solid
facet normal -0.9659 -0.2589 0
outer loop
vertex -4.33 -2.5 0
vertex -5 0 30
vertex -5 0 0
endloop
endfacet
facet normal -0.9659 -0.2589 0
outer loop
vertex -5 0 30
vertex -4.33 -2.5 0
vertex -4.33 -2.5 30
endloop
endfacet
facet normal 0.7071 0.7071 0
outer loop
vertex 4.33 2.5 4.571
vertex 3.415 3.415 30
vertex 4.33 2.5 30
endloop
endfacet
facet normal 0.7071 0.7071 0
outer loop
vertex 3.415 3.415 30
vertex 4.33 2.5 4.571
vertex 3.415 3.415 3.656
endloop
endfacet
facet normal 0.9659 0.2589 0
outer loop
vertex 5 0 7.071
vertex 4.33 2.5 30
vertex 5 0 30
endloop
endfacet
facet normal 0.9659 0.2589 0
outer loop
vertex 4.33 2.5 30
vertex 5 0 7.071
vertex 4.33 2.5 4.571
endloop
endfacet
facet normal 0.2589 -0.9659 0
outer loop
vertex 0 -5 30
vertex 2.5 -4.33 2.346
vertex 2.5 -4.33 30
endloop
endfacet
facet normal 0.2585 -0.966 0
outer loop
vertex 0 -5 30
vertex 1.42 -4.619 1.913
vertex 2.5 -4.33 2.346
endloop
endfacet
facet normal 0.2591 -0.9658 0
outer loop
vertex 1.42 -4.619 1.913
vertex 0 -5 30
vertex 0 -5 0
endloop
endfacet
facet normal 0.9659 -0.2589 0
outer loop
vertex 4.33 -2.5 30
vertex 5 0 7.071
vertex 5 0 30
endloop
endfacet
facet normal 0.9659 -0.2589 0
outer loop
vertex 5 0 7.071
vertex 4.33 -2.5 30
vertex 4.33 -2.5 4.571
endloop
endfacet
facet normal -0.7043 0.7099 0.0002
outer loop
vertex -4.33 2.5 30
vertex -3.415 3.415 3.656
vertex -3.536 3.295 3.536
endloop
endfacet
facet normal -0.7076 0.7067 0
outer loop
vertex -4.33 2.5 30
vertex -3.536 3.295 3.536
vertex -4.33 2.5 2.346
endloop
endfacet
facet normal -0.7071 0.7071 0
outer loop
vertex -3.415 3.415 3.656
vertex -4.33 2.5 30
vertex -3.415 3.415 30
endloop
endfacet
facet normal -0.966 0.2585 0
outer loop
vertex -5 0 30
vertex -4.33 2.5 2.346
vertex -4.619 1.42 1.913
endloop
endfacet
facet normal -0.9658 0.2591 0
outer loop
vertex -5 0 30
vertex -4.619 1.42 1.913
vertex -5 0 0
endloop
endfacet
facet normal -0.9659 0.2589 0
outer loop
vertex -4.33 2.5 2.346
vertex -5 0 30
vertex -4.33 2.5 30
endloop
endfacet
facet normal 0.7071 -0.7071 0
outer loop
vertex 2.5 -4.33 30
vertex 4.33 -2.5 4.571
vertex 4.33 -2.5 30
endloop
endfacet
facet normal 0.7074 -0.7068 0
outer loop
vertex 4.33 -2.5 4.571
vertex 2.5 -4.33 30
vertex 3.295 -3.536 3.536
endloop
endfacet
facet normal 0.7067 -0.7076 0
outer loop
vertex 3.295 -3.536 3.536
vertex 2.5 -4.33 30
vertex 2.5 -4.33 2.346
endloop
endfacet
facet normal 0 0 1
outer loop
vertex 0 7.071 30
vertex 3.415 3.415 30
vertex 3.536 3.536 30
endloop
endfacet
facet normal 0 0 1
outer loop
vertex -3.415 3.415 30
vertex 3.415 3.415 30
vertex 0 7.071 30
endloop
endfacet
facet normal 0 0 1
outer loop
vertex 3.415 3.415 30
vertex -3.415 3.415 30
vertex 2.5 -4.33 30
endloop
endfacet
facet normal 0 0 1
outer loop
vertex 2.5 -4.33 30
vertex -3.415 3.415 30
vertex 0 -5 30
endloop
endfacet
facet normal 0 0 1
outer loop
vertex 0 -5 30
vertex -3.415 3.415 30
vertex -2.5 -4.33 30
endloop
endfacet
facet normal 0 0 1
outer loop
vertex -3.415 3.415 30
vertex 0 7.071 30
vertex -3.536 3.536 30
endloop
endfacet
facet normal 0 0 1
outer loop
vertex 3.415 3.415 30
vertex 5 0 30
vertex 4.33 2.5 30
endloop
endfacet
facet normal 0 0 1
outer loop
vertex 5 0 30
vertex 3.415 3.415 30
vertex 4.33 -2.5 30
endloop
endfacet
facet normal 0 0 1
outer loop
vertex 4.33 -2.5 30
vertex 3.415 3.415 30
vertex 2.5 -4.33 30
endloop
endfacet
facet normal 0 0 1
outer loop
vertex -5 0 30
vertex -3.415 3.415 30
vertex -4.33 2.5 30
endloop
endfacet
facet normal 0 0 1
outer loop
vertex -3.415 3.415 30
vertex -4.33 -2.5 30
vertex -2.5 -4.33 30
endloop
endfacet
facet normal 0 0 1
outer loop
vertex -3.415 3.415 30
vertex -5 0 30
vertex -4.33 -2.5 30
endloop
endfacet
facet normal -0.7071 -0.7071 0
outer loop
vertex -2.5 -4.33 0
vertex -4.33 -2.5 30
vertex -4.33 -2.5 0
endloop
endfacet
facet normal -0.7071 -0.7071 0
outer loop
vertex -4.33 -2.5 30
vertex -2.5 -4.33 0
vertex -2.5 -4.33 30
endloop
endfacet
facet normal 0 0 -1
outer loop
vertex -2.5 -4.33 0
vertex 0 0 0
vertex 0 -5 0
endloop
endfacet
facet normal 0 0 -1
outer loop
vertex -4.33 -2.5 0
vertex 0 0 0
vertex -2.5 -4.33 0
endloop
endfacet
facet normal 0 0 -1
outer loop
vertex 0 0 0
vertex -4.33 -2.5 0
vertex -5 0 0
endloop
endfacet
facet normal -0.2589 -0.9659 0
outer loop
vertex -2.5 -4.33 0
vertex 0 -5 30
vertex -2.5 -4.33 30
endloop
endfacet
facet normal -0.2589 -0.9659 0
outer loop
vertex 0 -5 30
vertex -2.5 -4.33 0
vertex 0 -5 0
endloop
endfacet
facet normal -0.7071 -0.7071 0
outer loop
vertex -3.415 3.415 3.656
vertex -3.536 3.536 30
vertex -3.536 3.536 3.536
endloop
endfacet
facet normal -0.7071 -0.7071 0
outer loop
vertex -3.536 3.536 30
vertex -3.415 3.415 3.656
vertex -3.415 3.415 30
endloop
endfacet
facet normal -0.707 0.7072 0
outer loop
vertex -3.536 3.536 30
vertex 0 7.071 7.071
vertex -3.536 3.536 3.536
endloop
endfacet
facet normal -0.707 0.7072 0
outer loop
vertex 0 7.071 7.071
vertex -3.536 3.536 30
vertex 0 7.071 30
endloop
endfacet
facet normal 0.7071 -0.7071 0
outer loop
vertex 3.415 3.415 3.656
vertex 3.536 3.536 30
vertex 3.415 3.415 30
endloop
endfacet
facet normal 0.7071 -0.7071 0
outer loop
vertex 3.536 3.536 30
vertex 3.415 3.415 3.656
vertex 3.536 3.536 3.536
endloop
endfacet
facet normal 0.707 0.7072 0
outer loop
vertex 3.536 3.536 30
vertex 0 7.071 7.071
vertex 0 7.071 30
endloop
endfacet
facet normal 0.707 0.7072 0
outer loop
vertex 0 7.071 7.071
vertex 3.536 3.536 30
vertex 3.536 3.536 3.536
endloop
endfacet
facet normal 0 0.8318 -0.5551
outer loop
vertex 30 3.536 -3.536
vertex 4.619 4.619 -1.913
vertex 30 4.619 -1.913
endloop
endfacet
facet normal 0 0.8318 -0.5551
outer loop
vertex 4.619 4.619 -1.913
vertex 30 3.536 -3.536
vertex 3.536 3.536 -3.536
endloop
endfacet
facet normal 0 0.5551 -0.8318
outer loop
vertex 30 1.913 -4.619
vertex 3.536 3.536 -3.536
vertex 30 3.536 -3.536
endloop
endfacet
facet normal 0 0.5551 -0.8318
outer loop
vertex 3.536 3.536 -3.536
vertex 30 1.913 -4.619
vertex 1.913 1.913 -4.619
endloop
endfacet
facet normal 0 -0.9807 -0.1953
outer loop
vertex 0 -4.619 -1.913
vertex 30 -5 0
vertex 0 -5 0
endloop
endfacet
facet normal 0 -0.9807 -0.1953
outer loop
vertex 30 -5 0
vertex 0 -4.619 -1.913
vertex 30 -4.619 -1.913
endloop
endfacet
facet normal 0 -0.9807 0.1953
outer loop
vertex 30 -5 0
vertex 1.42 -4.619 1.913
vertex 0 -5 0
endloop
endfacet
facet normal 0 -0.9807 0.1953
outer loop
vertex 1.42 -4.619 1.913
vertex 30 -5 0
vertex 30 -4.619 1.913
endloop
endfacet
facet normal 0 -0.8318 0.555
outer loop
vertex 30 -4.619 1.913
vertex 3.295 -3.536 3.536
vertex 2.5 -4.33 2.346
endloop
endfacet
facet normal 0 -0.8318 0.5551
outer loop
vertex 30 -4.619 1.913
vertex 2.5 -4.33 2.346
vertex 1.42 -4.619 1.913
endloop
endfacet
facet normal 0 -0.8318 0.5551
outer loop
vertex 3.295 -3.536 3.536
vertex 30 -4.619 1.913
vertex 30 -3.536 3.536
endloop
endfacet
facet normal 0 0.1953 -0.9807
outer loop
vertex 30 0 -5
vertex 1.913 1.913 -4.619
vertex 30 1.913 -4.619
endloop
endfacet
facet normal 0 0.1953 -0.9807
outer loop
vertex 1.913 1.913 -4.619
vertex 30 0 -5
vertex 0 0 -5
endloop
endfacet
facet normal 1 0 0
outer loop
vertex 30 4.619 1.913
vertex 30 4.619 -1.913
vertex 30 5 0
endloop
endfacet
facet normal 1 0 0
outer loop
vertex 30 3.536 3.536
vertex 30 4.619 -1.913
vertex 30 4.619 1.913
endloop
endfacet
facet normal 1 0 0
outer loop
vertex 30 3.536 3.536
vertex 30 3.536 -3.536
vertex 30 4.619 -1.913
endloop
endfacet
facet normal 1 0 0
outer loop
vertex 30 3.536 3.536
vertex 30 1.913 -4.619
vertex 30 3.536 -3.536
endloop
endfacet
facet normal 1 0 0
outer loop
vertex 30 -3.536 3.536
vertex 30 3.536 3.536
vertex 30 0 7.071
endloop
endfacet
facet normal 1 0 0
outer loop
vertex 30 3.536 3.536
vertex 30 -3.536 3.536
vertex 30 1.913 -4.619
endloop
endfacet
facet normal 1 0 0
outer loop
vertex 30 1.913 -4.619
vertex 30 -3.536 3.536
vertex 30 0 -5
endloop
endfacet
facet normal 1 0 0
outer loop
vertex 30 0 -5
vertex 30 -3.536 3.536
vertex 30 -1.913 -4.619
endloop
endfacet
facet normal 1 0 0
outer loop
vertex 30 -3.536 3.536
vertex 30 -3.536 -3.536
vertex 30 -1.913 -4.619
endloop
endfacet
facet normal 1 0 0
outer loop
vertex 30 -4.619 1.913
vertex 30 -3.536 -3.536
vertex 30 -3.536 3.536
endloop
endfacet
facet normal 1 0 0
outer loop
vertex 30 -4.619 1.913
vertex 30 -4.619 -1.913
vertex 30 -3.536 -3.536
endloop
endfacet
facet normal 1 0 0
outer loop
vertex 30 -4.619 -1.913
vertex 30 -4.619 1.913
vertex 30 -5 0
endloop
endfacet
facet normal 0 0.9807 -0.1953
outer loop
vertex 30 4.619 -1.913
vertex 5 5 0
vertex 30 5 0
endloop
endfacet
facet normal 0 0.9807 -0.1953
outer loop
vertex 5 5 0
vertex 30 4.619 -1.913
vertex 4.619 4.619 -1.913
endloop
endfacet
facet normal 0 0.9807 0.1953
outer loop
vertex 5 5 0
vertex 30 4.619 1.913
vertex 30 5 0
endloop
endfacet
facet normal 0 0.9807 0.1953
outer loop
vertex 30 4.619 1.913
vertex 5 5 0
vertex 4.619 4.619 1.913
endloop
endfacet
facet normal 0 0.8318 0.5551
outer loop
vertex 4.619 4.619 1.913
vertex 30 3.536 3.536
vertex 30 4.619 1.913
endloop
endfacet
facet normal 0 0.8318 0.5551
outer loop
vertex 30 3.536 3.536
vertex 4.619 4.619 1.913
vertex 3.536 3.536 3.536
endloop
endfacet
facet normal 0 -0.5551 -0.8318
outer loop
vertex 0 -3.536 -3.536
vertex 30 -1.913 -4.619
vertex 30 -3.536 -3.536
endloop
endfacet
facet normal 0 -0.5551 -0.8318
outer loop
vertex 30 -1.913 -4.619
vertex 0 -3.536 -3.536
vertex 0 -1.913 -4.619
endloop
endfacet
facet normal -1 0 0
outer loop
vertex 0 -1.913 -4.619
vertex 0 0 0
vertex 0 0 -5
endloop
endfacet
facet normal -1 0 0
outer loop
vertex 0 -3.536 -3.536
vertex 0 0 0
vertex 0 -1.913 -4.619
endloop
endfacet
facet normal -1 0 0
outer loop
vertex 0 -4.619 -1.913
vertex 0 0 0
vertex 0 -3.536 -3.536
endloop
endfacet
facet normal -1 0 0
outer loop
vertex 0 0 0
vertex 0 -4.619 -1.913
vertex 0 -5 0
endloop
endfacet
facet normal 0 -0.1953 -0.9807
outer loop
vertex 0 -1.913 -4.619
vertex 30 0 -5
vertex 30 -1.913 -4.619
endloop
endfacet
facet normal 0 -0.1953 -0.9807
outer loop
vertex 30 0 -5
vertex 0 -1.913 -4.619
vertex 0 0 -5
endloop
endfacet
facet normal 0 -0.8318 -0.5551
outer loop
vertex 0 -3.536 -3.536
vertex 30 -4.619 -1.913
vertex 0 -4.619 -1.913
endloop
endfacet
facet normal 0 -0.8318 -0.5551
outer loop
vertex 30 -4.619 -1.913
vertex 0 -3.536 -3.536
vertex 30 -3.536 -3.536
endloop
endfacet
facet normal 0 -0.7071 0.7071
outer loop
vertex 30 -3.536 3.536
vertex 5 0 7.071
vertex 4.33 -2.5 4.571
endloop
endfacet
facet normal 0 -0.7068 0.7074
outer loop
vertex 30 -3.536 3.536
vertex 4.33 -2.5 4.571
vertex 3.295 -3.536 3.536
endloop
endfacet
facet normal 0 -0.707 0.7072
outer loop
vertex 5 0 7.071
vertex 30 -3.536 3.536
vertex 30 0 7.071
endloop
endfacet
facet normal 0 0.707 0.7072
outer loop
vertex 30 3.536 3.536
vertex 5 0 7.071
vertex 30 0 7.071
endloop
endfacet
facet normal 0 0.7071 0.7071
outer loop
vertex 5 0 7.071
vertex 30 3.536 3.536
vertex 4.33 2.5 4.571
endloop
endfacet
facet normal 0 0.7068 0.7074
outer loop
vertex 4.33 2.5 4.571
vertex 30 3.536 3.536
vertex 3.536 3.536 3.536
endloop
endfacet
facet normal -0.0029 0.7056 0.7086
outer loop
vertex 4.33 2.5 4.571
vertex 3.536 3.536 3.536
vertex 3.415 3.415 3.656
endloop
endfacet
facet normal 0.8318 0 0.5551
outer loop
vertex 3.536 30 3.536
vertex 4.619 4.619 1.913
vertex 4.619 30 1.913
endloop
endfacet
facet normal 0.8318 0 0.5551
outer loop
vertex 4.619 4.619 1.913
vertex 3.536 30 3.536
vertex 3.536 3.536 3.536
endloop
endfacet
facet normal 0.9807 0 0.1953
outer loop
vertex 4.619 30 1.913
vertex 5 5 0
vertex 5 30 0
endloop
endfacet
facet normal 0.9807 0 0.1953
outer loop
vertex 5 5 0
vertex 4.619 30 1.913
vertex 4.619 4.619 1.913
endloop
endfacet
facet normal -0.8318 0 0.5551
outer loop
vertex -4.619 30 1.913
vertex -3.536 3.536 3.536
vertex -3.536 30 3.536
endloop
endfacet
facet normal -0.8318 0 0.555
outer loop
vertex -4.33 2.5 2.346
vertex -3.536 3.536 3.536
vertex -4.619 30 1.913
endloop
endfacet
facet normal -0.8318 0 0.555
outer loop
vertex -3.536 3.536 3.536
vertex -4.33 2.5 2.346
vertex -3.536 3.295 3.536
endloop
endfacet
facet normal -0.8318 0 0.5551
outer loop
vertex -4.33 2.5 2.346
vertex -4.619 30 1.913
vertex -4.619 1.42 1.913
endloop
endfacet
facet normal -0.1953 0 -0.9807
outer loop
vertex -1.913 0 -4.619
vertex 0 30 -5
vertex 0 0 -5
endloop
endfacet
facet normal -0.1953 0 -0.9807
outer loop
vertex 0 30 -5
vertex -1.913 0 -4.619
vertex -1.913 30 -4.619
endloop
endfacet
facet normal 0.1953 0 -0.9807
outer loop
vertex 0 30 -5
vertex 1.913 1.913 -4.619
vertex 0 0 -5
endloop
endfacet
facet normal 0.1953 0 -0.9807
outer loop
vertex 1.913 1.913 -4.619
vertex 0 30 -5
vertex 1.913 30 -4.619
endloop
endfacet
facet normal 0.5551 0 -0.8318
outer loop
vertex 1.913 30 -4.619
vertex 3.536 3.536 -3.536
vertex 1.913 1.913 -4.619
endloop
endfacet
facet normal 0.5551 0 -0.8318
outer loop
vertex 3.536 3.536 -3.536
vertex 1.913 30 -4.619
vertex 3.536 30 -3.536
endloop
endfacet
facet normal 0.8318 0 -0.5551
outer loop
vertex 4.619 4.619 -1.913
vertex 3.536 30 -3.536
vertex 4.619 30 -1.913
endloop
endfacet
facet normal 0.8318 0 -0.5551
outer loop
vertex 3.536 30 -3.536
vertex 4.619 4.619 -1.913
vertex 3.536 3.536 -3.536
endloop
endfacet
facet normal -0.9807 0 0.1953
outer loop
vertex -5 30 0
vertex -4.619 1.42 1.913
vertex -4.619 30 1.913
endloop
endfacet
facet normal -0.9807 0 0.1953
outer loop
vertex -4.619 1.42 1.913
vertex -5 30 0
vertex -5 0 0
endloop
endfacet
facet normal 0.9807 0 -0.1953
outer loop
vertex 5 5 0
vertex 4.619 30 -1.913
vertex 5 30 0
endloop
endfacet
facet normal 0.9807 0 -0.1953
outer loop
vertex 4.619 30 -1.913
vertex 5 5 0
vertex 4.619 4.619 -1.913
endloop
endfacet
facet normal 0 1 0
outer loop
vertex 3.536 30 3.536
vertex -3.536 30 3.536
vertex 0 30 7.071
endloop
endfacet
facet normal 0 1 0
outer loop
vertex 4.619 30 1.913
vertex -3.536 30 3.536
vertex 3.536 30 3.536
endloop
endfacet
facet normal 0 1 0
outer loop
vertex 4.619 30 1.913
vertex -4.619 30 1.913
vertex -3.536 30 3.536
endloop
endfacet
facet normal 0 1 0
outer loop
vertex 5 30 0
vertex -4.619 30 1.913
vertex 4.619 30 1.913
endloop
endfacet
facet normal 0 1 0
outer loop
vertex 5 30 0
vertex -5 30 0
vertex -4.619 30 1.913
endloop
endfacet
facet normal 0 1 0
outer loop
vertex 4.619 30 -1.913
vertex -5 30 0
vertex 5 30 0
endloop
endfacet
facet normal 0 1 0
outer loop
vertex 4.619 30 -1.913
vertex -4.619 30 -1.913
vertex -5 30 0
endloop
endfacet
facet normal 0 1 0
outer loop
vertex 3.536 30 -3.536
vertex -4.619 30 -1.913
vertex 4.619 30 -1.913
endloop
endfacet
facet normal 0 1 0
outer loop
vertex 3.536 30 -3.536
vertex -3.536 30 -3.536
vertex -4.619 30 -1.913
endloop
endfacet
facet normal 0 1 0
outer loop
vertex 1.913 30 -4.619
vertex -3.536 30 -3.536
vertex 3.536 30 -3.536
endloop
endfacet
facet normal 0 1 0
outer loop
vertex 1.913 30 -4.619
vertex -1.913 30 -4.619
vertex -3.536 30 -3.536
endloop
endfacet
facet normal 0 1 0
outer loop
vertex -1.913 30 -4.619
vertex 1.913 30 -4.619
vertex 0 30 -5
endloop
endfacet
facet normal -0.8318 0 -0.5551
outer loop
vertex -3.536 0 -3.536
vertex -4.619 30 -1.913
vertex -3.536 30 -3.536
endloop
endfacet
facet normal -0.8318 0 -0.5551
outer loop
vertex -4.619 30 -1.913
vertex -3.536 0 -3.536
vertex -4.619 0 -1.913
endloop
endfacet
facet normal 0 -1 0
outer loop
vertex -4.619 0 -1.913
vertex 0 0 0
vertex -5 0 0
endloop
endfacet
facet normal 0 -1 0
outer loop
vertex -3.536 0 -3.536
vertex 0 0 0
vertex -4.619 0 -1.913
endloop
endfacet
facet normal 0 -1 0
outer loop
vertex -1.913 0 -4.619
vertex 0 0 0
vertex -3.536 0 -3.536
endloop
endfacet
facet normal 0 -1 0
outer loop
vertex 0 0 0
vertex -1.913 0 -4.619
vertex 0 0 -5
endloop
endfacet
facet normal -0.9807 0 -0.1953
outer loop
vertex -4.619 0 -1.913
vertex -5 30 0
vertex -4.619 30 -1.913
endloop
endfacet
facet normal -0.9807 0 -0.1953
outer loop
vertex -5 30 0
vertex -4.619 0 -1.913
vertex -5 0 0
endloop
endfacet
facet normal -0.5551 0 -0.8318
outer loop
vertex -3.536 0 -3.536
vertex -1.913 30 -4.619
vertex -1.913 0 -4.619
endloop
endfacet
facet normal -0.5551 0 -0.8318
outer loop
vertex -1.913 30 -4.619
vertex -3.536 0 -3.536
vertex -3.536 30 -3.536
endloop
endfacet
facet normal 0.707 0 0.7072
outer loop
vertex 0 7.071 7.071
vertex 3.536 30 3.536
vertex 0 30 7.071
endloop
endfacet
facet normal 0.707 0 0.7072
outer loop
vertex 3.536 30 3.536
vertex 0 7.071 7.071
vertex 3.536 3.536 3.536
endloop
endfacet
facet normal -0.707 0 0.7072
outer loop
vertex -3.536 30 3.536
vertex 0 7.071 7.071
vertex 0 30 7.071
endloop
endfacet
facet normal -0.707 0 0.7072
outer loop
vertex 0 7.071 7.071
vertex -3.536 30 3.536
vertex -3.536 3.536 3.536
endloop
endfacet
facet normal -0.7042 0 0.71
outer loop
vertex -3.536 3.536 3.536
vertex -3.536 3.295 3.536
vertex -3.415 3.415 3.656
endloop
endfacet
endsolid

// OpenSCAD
// Base teardrop shape, one end centred on origin, extending for given distance
// (positive or negative) along the X axis.
//
// l = length of shape (negative extends in -x direction)
// d = diametar of hole
// q = quadrant orientation of point: 
//       0 => +x
//       1 => +y
//       2 => -x
//       3 => -y
//
module TeardropZ(l,d,q)
{
    zl = abs(l);
    zo = min(0,l);
    translate([0,0,zo])
    {
        cylinder(r=d/2,h=zl);
        rotate([0,0,-45+q*90]) cube([d/2,d/2,zl]);
    }
}

// Teardrop shape aligned along X-axis.
//
// Use for making horizontal holes in objects.
//
// l = length of shape (negative extends in -x direction)
// d = diametar of hole
// q = quadrant orientation of point: 
//       0 => +z
//       1 => +y
//       2 => -z
//       3 => -y
module TeardropX(l,d,q)
{
    rotate([0,-90,0]) TeardropZ(-l,d,q);
}

// Teardrop shape aligned along Y-axis.
//
// Use for making horizontal holes in objects.
//
// l = length of shape (negative extends in -x direction)
// d = diametar of hole
// q = quadrant orientation of point: 
//       0 => +z
//       1 => +x
//       2 => -z
//       3 => -x
module TeardropY(l,d,q)
{
    rotate([90,0,0]) TeardropZ(-l,d,-q+1);
}


// Examples
TeardropZ(30,10,1,$fn=12);
TeardropX(30,10,0);
TeardropY(30,10,0);
